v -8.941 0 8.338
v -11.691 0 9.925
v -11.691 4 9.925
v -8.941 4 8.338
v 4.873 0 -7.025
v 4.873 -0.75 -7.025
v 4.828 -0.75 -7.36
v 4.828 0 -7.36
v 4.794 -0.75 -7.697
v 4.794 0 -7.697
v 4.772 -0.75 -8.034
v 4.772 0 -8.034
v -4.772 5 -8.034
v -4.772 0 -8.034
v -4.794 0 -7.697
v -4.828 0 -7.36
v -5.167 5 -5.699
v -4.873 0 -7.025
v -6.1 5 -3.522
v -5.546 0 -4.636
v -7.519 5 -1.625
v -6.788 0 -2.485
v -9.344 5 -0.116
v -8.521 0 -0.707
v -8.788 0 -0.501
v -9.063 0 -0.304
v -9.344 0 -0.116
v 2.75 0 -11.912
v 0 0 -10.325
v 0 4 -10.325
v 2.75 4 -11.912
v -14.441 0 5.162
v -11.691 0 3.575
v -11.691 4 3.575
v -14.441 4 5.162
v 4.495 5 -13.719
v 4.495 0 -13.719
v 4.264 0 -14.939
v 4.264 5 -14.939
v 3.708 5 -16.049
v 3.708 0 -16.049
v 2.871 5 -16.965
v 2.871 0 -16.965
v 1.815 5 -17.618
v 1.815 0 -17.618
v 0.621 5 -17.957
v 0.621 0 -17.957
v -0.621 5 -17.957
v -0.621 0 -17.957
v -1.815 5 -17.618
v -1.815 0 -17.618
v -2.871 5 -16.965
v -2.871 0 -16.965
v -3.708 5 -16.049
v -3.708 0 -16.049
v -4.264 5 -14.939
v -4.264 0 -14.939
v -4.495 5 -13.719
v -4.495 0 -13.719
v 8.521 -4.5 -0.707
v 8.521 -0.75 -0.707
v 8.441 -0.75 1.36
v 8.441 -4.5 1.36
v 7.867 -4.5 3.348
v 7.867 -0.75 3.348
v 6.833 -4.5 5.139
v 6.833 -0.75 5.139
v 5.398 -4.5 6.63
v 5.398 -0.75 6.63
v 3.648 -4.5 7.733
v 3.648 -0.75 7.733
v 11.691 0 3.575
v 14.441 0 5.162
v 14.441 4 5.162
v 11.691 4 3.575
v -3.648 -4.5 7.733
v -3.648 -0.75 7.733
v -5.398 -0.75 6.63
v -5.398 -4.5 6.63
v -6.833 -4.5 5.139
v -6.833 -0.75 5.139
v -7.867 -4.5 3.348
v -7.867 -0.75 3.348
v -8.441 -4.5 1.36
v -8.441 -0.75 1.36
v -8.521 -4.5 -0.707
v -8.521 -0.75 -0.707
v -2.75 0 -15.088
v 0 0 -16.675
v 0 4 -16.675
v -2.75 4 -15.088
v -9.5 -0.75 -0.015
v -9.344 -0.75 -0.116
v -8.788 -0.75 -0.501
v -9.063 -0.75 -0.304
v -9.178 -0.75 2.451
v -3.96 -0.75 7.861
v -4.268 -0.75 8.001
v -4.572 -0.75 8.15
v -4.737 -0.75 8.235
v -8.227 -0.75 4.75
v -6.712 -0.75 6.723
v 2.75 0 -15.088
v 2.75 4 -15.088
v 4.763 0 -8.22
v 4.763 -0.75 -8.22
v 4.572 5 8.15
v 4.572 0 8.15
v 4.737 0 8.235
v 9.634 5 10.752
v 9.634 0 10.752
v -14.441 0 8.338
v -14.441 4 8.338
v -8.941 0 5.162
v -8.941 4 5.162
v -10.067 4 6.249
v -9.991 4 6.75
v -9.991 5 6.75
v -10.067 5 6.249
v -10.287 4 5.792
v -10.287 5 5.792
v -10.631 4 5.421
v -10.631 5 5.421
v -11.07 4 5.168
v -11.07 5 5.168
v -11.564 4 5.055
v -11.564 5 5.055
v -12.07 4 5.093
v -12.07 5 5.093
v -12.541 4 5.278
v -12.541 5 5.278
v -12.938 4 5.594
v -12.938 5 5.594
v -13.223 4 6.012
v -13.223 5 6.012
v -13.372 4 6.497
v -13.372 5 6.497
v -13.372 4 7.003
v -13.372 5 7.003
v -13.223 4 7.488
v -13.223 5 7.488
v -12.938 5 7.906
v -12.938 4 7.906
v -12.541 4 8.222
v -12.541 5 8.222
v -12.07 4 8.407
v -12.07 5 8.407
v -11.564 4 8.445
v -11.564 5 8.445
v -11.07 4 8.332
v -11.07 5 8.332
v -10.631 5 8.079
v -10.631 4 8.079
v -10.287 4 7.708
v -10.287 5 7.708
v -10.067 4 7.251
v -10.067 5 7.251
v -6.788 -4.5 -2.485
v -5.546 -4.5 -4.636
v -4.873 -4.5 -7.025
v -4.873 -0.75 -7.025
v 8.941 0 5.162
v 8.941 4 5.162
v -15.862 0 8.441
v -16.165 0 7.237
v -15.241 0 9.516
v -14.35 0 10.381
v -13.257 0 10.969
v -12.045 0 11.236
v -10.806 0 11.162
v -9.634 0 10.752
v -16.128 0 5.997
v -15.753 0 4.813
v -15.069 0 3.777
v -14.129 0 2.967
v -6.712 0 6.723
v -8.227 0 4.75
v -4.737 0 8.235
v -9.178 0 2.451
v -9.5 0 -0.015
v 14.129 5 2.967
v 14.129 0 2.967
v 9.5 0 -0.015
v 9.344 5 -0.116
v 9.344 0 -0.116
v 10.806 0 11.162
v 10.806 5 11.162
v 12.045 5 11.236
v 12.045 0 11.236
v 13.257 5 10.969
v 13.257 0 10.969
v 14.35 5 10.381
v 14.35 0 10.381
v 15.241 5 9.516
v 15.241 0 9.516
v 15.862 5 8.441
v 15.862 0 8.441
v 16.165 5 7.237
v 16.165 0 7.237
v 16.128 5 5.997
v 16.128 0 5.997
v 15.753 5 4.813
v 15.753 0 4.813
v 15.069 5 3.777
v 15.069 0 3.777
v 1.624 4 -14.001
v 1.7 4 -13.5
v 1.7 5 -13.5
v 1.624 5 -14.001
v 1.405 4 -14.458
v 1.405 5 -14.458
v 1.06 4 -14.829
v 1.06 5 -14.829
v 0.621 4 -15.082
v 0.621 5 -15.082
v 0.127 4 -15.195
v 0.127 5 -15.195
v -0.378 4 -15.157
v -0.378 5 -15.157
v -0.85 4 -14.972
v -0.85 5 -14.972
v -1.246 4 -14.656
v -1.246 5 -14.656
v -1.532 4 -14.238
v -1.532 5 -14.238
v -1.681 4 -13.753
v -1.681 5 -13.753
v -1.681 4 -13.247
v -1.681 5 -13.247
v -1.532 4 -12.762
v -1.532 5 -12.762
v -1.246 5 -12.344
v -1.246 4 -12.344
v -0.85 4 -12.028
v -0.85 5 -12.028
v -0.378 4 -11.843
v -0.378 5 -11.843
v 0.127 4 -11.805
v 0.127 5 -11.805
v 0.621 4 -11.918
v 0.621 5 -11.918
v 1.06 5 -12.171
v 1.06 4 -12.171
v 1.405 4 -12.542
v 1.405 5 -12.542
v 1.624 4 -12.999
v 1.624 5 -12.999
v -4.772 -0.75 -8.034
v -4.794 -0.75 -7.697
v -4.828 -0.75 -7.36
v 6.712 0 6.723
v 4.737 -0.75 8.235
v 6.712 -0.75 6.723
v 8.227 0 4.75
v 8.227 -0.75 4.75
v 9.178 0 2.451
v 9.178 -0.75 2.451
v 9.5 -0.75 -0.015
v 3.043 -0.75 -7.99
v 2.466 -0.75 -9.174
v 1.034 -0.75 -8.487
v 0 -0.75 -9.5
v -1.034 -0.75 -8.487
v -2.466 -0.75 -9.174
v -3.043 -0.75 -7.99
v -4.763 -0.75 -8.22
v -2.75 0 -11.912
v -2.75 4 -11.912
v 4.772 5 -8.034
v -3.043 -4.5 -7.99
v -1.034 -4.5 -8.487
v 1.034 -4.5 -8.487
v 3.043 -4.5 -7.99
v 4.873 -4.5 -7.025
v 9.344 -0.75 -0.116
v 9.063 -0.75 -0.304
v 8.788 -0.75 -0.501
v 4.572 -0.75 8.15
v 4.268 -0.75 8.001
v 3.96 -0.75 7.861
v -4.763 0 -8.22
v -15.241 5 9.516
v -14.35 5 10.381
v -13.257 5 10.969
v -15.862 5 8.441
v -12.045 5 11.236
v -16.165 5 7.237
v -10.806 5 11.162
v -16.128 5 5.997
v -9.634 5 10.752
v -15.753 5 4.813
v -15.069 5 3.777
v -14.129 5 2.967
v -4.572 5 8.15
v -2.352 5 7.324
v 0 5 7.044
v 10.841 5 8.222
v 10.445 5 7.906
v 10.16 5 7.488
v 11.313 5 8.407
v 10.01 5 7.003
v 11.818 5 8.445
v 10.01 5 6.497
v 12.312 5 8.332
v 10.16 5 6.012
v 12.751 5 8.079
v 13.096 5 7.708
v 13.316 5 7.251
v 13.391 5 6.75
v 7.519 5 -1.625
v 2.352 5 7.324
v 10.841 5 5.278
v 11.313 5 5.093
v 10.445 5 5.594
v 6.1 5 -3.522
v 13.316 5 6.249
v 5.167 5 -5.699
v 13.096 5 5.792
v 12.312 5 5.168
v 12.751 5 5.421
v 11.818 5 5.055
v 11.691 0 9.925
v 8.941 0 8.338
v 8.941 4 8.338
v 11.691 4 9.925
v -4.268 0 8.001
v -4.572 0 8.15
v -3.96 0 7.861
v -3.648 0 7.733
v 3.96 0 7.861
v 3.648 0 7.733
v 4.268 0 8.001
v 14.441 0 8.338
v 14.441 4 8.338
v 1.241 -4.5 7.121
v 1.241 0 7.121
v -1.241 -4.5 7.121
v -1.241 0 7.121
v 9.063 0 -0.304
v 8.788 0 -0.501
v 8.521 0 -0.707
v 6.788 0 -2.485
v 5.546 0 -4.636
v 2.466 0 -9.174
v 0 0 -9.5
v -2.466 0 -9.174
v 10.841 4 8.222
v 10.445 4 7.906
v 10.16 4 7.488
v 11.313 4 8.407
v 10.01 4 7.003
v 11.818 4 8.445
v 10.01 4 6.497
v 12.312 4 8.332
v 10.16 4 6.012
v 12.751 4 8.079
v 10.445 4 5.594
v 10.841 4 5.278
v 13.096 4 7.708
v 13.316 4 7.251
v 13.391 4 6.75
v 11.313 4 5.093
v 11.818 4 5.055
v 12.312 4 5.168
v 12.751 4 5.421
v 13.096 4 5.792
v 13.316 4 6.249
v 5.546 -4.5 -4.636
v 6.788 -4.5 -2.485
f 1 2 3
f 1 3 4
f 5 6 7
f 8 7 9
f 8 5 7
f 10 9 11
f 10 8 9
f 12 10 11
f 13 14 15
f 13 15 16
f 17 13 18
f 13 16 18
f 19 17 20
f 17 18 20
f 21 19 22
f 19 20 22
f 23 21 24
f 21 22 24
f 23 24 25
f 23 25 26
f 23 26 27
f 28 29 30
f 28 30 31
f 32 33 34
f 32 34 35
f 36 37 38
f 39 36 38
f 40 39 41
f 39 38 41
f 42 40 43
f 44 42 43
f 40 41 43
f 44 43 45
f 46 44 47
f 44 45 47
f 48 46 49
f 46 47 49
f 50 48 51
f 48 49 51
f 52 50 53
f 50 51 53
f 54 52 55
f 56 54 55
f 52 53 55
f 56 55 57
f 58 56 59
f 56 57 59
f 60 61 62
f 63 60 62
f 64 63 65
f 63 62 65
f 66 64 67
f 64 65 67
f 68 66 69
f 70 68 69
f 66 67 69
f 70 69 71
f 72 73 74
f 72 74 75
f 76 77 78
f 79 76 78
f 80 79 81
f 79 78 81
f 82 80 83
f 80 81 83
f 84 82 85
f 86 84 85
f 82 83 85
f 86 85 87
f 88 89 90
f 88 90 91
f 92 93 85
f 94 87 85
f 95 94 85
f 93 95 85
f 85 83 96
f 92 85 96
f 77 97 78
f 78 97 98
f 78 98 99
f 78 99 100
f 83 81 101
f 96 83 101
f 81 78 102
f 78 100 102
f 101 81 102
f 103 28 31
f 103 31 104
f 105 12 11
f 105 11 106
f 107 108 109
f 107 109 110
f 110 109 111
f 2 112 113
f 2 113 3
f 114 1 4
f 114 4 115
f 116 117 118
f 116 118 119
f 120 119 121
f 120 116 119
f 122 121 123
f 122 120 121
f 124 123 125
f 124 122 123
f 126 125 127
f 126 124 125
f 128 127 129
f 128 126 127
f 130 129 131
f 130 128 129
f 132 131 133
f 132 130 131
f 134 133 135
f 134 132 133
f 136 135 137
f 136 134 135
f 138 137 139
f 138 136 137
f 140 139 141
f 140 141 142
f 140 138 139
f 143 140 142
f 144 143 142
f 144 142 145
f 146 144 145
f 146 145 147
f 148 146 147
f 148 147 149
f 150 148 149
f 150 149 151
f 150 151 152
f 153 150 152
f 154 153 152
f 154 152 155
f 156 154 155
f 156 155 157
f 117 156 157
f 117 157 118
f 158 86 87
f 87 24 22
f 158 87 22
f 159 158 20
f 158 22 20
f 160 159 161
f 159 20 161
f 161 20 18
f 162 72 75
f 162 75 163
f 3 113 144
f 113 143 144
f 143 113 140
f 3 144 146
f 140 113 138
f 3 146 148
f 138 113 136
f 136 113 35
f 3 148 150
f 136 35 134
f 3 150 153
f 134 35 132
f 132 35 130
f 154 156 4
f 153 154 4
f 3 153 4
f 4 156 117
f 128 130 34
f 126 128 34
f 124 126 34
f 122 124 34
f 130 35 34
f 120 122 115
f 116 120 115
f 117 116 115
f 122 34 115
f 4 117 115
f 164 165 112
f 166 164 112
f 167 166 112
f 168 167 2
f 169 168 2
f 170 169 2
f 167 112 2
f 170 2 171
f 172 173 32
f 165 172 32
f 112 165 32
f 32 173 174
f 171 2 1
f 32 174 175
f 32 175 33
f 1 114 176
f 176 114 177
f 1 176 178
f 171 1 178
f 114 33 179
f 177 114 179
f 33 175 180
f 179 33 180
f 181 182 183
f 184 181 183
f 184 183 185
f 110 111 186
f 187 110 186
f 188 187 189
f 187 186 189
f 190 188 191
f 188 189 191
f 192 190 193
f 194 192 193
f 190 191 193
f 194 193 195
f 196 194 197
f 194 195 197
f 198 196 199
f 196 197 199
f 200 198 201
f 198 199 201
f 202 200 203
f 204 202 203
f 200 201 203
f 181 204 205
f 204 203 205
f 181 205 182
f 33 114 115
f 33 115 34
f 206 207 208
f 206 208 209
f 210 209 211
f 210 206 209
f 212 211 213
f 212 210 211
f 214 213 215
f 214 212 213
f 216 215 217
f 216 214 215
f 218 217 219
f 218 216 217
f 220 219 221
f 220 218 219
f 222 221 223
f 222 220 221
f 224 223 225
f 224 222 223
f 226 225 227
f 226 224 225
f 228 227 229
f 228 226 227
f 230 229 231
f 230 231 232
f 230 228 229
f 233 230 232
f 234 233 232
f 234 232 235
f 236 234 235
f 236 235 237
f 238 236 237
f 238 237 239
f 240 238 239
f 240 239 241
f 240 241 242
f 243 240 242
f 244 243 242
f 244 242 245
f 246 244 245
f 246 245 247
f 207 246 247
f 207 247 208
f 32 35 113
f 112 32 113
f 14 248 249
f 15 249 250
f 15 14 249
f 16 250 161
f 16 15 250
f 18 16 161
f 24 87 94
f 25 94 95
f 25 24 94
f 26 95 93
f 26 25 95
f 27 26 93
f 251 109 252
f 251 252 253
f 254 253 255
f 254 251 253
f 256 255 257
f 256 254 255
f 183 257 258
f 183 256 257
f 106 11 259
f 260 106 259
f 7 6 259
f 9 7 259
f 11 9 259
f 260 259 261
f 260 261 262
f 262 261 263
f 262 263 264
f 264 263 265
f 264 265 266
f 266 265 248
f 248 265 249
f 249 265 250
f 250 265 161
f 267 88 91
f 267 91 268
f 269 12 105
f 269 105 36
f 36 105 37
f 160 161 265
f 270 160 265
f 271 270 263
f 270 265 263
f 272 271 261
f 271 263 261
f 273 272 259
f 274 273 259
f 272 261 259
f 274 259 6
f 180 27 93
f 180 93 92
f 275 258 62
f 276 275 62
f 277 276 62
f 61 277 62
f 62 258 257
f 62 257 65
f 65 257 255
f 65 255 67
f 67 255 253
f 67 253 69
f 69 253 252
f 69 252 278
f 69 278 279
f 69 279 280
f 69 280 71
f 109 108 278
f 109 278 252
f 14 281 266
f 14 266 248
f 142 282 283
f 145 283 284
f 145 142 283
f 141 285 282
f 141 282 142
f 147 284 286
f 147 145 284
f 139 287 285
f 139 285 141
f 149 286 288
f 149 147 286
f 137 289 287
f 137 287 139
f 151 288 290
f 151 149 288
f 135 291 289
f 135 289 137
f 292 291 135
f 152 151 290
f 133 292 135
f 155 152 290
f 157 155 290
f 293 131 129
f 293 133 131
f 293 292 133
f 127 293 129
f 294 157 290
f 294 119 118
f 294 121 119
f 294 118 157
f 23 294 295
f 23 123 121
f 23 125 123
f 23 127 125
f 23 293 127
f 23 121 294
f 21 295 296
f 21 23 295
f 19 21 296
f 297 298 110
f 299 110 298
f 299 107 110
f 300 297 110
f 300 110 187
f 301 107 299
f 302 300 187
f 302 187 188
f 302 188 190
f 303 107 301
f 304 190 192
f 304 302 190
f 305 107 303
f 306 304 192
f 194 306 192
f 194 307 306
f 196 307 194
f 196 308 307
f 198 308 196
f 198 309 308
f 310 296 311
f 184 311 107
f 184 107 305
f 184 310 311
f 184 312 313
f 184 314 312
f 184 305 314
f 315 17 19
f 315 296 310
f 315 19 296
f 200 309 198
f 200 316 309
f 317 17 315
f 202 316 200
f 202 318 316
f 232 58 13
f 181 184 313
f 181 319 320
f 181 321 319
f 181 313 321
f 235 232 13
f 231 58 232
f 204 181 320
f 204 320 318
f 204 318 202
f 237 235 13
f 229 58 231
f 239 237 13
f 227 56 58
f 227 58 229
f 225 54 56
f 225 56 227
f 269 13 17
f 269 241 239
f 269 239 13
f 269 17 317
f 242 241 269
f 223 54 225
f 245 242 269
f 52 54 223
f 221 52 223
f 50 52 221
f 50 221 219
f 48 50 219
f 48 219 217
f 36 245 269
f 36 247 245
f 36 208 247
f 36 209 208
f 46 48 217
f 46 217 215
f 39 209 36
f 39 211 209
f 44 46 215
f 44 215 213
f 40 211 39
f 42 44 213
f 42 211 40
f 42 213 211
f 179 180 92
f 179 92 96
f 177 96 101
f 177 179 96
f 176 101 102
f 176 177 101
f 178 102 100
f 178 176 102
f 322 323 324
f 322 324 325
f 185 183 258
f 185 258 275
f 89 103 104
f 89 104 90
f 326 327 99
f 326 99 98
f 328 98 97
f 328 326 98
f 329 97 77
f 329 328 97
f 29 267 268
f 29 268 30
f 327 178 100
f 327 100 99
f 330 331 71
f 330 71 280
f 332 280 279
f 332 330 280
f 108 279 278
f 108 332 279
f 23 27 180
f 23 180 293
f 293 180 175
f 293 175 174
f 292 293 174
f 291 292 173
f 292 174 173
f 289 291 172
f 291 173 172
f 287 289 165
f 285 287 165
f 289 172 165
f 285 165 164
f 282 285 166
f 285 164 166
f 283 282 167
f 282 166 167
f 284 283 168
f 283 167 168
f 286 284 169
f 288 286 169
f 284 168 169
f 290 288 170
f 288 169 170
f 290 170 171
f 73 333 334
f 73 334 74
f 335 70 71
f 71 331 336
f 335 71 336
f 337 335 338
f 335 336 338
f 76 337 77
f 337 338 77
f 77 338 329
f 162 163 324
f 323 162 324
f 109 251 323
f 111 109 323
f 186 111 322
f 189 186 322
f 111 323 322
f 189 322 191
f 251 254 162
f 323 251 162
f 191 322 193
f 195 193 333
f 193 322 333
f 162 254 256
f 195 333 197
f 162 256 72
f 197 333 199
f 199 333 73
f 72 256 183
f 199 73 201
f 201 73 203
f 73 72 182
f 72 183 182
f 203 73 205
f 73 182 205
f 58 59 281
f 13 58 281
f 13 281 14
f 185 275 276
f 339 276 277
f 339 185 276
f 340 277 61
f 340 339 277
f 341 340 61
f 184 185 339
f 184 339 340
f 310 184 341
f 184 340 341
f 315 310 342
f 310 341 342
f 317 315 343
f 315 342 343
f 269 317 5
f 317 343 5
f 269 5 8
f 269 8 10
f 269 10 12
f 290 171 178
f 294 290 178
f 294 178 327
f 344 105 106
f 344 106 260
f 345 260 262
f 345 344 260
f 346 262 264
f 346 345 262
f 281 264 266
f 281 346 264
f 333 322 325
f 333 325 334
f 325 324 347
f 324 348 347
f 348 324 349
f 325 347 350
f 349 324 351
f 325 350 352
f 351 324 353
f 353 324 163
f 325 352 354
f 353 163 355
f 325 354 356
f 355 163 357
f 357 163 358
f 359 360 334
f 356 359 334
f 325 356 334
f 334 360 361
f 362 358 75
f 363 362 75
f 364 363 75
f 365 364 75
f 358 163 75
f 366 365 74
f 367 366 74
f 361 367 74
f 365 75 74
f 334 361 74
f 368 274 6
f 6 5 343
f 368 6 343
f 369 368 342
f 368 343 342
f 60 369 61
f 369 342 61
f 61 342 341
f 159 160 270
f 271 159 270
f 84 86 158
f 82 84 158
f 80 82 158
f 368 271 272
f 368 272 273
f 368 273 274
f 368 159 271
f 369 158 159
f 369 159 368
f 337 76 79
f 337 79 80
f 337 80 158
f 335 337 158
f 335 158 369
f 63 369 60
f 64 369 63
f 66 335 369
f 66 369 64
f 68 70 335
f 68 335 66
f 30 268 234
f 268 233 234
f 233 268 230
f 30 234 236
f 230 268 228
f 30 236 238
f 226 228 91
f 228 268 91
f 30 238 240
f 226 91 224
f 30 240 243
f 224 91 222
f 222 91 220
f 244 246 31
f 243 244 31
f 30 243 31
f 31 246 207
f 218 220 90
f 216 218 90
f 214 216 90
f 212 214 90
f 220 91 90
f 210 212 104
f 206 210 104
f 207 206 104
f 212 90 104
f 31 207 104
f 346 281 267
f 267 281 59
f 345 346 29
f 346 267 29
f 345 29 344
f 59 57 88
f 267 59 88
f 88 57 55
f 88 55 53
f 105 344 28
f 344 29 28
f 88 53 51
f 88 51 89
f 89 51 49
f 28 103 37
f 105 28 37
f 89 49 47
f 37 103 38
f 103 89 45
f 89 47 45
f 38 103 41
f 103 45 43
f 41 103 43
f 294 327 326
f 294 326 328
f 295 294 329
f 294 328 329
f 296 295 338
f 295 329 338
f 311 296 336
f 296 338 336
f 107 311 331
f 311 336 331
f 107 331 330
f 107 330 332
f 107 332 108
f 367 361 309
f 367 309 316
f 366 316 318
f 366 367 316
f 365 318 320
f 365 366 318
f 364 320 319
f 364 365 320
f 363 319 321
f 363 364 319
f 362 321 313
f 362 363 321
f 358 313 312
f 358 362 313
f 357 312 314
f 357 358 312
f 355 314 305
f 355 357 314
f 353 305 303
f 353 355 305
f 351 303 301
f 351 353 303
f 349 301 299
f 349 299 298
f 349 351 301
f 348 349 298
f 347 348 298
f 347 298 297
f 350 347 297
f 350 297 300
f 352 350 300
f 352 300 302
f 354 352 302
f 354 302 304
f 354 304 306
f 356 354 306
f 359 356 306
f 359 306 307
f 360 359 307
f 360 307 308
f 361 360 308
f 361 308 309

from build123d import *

# Parameters (mm, degrees)
SKETCH1_R           = 1.7
BOSS_EXTRUDE1_DEPTH = 5
CUT_EXTRUDE1_START  = -5
CUT_EXTRUDE1_DEPTH  = 4
BOSS_EXTRUDE3_DEPTH = 4.5
BOSS_EXTRUDE4_DEPTH = 0.75


with BuildPart() as part:
    # Sketch1 → Boss-Extrude1 (new body)
    with BuildSketch(Plane(origin=(0, 0, 0), x_dir=(1, 0, 0), z_dir=(0, 1, 0))):
        with BuildLine():
            Line((-4.494644994, 13.719468408), (-4.772250922, 8.034184997))
            ThreePointArc((-4.772250922, 8.034184997), (-6.10009687, 3.52189257), (-9.343933767, 0.115798034))
            Line((-9.343933767, 0.115798034), (-14.128730664, -2.967257459))
            ThreePointArc((-14.128730664, -2.967257459), (-15.588457268, -9), (-9.634085671, -10.752210949))
            Line((-9.634085671, -10.752210949), (-4.571682845, -8.149983031))
            ThreePointArc((-4.571682845, -8.149983031), (0, -7.04378514), (4.571682845, -8.149983031))
            Line((4.571682845, -8.149983031), (9.634085671, -10.752210949))
            ThreePointArc((9.634085671, -10.752210949), (15.588457268, -9), (14.128730664, -2.967257459))
            Line((14.128730664, -2.967257459), (9.343933767, 0.115798034))
            ThreePointArc((9.343933767, 0.115798034), (6.10009687, 3.52189257), (4.772250922, 8.034184997))
            Line((4.772250922, 8.034184997), (4.494644994, 13.719468408))
            ThreePointArc((4.494644994, 13.719468408), (0, 18), (-4.494644994, 13.719468408))
        make_face()
        with Locations((0, 13.5)):
            Circle(SKETCH1_R, mode=Mode.SUBTRACT)
        with Locations((11.691342951, -6.75)):
            Circle(SKETCH1_R, mode=Mode.SUBTRACT)
        with Locations((-11.691342951, -6.75)):
            Circle(SKETCH1_R, mode=Mode.SUBTRACT)
    extrude(amount=BOSS_EXTRUDE1_DEPTH)

    # Sketch2 → Cut-Extrude1 (cut)
    with BuildSketch(Plane(origin=(0, 5, 0), x_dir=(1, 0, 0), z_dir=(0, 1, 0)).offset(CUT_EXTRUDE1_START)):
        Polygon((14.441342951, -8.33771324), (14.441342951, -5.16228676), (11.691342951, -3.574573519), (8.941342951, -5.16228676), (8.941342951, -8.33771324), (11.691342951, -9.925426481), align=None)
        Polygon((0, 16.675426481), (-2.75, 15.08771324), (-2.75, 11.91228676), (0, 10.324573519), (2.75, 11.91228676), (2.75, 15.08771324), align=None)
        Polygon((-14.441342951, -8.33771324), (-11.691342951, -9.925426481), (-8.941342951, -8.33771324), (-8.941342951, -5.16228676), (-11.691342951, -3.574573519), (-14.441342951, -5.16228676), align=None)
    extrude(amount=CUT_EXTRUDE1_DEPTH, mode=Mode.SUBTRACT)

    # Sketch7 → Boss-Extrude3 (add)
    with BuildSketch(Plane.XZ):
        with BuildLine():
            ThreePointArc((-4.872953171, -7.025441438), (0, -8.55), (4.872953171, -7.025441438))
            ThreePointArc((4.872953171, -7.025441438), (6.10009687, -3.52189257), (8.520687343, -0.707380519))
            ThreePointArc((8.520687343, -0.707380519), (7.404517202, 4.275), (3.647734172, 7.732821956))
            ThreePointArc((3.647734172, 7.732821956), (0, 7.04378514), (-3.647734172, 7.732821956))
            ThreePointArc((-3.647734172, 7.732821956), (-7.404517202, 4.275), (-8.520687343, -0.707380519))
            ThreePointArc((-8.520687343, -0.707380519), (-6.10009687, -3.52189257), (-4.872953171, -7.025441438))
        make_face()
    extrude(amount=BOSS_EXTRUDE3_DEPTH)

    # Sketch8 → Boss-Extrude4 (add)
    with BuildSketch(Plane.XZ):
        with BuildLine():
            Line((-9.343933767, -0.115798034), (-9.499987767, -0.015245565))
            ThreePointArc((-9.499987767, -0.015245565), (-8.227241336, 4.75), (-4.736790837, 8.234853524))
            Line((-4.736790837, 8.234853524), (-4.571682845, 8.149983031))
            ThreePointArc((-4.571682845, 8.149983031), (-4.114998161, 7.929686713), (-3.647734172, 7.732821956))
            ThreePointArc((-3.647734172, 7.732821956), (-7.404517202, 4.275), (-8.520687343, -0.707380519))
            ThreePointArc((-8.520687343, -0.707380519), (-8.924809218, -0.401150413), (-9.343933767, -0.115798034))
        make_face()
        with BuildLine():
            Line((4.571682845, 8.149983031), (4.736790837, 8.234853524))
            ThreePointArc((4.736790837, 8.234853524), (8.227241336, 4.75), (9.499987767, -0.015245565))
            Line((9.499987767, -0.015245565), (9.343933767, -0.115798034))
            ThreePointArc((9.343933767, -0.115798034), (8.924809218, -0.401150413), (8.520687343, -0.707380519))
            ThreePointArc((8.520687343, -0.707380519), (7.404517202, 4.275), (3.647734172, 7.732821956))
            ThreePointArc((3.647734172, 7.732821956), (4.114998161, 7.929686713), (4.571682845, 8.149983031))
        make_face()
        with BuildLine():
            Line((4.772250922, -8.034184997), (4.76319693, -8.219607959))
            ThreePointArc((4.76319693, -8.219607959), (0, -9.5), (-4.76319693, -8.219607959))
            Line((-4.76319693, -8.219607959), (-4.772250922, -8.034184997))
            ThreePointArc((-4.772250922, -8.034184997), (-4.809811057, -7.528536301), (-4.872953171, -7.025441437))
            ThreePointArc((-4.872953171, -7.025441437), (0, -8.55), (4.872953171, -7.025441438))
            ThreePointArc((4.872953171, -7.025441438), (4.809811057, -7.528536301), (4.772250922, -8.034184997))
        make_face()
    extrude(amount=BOSS_EXTRUDE4_DEPTH)


solid = part.part
